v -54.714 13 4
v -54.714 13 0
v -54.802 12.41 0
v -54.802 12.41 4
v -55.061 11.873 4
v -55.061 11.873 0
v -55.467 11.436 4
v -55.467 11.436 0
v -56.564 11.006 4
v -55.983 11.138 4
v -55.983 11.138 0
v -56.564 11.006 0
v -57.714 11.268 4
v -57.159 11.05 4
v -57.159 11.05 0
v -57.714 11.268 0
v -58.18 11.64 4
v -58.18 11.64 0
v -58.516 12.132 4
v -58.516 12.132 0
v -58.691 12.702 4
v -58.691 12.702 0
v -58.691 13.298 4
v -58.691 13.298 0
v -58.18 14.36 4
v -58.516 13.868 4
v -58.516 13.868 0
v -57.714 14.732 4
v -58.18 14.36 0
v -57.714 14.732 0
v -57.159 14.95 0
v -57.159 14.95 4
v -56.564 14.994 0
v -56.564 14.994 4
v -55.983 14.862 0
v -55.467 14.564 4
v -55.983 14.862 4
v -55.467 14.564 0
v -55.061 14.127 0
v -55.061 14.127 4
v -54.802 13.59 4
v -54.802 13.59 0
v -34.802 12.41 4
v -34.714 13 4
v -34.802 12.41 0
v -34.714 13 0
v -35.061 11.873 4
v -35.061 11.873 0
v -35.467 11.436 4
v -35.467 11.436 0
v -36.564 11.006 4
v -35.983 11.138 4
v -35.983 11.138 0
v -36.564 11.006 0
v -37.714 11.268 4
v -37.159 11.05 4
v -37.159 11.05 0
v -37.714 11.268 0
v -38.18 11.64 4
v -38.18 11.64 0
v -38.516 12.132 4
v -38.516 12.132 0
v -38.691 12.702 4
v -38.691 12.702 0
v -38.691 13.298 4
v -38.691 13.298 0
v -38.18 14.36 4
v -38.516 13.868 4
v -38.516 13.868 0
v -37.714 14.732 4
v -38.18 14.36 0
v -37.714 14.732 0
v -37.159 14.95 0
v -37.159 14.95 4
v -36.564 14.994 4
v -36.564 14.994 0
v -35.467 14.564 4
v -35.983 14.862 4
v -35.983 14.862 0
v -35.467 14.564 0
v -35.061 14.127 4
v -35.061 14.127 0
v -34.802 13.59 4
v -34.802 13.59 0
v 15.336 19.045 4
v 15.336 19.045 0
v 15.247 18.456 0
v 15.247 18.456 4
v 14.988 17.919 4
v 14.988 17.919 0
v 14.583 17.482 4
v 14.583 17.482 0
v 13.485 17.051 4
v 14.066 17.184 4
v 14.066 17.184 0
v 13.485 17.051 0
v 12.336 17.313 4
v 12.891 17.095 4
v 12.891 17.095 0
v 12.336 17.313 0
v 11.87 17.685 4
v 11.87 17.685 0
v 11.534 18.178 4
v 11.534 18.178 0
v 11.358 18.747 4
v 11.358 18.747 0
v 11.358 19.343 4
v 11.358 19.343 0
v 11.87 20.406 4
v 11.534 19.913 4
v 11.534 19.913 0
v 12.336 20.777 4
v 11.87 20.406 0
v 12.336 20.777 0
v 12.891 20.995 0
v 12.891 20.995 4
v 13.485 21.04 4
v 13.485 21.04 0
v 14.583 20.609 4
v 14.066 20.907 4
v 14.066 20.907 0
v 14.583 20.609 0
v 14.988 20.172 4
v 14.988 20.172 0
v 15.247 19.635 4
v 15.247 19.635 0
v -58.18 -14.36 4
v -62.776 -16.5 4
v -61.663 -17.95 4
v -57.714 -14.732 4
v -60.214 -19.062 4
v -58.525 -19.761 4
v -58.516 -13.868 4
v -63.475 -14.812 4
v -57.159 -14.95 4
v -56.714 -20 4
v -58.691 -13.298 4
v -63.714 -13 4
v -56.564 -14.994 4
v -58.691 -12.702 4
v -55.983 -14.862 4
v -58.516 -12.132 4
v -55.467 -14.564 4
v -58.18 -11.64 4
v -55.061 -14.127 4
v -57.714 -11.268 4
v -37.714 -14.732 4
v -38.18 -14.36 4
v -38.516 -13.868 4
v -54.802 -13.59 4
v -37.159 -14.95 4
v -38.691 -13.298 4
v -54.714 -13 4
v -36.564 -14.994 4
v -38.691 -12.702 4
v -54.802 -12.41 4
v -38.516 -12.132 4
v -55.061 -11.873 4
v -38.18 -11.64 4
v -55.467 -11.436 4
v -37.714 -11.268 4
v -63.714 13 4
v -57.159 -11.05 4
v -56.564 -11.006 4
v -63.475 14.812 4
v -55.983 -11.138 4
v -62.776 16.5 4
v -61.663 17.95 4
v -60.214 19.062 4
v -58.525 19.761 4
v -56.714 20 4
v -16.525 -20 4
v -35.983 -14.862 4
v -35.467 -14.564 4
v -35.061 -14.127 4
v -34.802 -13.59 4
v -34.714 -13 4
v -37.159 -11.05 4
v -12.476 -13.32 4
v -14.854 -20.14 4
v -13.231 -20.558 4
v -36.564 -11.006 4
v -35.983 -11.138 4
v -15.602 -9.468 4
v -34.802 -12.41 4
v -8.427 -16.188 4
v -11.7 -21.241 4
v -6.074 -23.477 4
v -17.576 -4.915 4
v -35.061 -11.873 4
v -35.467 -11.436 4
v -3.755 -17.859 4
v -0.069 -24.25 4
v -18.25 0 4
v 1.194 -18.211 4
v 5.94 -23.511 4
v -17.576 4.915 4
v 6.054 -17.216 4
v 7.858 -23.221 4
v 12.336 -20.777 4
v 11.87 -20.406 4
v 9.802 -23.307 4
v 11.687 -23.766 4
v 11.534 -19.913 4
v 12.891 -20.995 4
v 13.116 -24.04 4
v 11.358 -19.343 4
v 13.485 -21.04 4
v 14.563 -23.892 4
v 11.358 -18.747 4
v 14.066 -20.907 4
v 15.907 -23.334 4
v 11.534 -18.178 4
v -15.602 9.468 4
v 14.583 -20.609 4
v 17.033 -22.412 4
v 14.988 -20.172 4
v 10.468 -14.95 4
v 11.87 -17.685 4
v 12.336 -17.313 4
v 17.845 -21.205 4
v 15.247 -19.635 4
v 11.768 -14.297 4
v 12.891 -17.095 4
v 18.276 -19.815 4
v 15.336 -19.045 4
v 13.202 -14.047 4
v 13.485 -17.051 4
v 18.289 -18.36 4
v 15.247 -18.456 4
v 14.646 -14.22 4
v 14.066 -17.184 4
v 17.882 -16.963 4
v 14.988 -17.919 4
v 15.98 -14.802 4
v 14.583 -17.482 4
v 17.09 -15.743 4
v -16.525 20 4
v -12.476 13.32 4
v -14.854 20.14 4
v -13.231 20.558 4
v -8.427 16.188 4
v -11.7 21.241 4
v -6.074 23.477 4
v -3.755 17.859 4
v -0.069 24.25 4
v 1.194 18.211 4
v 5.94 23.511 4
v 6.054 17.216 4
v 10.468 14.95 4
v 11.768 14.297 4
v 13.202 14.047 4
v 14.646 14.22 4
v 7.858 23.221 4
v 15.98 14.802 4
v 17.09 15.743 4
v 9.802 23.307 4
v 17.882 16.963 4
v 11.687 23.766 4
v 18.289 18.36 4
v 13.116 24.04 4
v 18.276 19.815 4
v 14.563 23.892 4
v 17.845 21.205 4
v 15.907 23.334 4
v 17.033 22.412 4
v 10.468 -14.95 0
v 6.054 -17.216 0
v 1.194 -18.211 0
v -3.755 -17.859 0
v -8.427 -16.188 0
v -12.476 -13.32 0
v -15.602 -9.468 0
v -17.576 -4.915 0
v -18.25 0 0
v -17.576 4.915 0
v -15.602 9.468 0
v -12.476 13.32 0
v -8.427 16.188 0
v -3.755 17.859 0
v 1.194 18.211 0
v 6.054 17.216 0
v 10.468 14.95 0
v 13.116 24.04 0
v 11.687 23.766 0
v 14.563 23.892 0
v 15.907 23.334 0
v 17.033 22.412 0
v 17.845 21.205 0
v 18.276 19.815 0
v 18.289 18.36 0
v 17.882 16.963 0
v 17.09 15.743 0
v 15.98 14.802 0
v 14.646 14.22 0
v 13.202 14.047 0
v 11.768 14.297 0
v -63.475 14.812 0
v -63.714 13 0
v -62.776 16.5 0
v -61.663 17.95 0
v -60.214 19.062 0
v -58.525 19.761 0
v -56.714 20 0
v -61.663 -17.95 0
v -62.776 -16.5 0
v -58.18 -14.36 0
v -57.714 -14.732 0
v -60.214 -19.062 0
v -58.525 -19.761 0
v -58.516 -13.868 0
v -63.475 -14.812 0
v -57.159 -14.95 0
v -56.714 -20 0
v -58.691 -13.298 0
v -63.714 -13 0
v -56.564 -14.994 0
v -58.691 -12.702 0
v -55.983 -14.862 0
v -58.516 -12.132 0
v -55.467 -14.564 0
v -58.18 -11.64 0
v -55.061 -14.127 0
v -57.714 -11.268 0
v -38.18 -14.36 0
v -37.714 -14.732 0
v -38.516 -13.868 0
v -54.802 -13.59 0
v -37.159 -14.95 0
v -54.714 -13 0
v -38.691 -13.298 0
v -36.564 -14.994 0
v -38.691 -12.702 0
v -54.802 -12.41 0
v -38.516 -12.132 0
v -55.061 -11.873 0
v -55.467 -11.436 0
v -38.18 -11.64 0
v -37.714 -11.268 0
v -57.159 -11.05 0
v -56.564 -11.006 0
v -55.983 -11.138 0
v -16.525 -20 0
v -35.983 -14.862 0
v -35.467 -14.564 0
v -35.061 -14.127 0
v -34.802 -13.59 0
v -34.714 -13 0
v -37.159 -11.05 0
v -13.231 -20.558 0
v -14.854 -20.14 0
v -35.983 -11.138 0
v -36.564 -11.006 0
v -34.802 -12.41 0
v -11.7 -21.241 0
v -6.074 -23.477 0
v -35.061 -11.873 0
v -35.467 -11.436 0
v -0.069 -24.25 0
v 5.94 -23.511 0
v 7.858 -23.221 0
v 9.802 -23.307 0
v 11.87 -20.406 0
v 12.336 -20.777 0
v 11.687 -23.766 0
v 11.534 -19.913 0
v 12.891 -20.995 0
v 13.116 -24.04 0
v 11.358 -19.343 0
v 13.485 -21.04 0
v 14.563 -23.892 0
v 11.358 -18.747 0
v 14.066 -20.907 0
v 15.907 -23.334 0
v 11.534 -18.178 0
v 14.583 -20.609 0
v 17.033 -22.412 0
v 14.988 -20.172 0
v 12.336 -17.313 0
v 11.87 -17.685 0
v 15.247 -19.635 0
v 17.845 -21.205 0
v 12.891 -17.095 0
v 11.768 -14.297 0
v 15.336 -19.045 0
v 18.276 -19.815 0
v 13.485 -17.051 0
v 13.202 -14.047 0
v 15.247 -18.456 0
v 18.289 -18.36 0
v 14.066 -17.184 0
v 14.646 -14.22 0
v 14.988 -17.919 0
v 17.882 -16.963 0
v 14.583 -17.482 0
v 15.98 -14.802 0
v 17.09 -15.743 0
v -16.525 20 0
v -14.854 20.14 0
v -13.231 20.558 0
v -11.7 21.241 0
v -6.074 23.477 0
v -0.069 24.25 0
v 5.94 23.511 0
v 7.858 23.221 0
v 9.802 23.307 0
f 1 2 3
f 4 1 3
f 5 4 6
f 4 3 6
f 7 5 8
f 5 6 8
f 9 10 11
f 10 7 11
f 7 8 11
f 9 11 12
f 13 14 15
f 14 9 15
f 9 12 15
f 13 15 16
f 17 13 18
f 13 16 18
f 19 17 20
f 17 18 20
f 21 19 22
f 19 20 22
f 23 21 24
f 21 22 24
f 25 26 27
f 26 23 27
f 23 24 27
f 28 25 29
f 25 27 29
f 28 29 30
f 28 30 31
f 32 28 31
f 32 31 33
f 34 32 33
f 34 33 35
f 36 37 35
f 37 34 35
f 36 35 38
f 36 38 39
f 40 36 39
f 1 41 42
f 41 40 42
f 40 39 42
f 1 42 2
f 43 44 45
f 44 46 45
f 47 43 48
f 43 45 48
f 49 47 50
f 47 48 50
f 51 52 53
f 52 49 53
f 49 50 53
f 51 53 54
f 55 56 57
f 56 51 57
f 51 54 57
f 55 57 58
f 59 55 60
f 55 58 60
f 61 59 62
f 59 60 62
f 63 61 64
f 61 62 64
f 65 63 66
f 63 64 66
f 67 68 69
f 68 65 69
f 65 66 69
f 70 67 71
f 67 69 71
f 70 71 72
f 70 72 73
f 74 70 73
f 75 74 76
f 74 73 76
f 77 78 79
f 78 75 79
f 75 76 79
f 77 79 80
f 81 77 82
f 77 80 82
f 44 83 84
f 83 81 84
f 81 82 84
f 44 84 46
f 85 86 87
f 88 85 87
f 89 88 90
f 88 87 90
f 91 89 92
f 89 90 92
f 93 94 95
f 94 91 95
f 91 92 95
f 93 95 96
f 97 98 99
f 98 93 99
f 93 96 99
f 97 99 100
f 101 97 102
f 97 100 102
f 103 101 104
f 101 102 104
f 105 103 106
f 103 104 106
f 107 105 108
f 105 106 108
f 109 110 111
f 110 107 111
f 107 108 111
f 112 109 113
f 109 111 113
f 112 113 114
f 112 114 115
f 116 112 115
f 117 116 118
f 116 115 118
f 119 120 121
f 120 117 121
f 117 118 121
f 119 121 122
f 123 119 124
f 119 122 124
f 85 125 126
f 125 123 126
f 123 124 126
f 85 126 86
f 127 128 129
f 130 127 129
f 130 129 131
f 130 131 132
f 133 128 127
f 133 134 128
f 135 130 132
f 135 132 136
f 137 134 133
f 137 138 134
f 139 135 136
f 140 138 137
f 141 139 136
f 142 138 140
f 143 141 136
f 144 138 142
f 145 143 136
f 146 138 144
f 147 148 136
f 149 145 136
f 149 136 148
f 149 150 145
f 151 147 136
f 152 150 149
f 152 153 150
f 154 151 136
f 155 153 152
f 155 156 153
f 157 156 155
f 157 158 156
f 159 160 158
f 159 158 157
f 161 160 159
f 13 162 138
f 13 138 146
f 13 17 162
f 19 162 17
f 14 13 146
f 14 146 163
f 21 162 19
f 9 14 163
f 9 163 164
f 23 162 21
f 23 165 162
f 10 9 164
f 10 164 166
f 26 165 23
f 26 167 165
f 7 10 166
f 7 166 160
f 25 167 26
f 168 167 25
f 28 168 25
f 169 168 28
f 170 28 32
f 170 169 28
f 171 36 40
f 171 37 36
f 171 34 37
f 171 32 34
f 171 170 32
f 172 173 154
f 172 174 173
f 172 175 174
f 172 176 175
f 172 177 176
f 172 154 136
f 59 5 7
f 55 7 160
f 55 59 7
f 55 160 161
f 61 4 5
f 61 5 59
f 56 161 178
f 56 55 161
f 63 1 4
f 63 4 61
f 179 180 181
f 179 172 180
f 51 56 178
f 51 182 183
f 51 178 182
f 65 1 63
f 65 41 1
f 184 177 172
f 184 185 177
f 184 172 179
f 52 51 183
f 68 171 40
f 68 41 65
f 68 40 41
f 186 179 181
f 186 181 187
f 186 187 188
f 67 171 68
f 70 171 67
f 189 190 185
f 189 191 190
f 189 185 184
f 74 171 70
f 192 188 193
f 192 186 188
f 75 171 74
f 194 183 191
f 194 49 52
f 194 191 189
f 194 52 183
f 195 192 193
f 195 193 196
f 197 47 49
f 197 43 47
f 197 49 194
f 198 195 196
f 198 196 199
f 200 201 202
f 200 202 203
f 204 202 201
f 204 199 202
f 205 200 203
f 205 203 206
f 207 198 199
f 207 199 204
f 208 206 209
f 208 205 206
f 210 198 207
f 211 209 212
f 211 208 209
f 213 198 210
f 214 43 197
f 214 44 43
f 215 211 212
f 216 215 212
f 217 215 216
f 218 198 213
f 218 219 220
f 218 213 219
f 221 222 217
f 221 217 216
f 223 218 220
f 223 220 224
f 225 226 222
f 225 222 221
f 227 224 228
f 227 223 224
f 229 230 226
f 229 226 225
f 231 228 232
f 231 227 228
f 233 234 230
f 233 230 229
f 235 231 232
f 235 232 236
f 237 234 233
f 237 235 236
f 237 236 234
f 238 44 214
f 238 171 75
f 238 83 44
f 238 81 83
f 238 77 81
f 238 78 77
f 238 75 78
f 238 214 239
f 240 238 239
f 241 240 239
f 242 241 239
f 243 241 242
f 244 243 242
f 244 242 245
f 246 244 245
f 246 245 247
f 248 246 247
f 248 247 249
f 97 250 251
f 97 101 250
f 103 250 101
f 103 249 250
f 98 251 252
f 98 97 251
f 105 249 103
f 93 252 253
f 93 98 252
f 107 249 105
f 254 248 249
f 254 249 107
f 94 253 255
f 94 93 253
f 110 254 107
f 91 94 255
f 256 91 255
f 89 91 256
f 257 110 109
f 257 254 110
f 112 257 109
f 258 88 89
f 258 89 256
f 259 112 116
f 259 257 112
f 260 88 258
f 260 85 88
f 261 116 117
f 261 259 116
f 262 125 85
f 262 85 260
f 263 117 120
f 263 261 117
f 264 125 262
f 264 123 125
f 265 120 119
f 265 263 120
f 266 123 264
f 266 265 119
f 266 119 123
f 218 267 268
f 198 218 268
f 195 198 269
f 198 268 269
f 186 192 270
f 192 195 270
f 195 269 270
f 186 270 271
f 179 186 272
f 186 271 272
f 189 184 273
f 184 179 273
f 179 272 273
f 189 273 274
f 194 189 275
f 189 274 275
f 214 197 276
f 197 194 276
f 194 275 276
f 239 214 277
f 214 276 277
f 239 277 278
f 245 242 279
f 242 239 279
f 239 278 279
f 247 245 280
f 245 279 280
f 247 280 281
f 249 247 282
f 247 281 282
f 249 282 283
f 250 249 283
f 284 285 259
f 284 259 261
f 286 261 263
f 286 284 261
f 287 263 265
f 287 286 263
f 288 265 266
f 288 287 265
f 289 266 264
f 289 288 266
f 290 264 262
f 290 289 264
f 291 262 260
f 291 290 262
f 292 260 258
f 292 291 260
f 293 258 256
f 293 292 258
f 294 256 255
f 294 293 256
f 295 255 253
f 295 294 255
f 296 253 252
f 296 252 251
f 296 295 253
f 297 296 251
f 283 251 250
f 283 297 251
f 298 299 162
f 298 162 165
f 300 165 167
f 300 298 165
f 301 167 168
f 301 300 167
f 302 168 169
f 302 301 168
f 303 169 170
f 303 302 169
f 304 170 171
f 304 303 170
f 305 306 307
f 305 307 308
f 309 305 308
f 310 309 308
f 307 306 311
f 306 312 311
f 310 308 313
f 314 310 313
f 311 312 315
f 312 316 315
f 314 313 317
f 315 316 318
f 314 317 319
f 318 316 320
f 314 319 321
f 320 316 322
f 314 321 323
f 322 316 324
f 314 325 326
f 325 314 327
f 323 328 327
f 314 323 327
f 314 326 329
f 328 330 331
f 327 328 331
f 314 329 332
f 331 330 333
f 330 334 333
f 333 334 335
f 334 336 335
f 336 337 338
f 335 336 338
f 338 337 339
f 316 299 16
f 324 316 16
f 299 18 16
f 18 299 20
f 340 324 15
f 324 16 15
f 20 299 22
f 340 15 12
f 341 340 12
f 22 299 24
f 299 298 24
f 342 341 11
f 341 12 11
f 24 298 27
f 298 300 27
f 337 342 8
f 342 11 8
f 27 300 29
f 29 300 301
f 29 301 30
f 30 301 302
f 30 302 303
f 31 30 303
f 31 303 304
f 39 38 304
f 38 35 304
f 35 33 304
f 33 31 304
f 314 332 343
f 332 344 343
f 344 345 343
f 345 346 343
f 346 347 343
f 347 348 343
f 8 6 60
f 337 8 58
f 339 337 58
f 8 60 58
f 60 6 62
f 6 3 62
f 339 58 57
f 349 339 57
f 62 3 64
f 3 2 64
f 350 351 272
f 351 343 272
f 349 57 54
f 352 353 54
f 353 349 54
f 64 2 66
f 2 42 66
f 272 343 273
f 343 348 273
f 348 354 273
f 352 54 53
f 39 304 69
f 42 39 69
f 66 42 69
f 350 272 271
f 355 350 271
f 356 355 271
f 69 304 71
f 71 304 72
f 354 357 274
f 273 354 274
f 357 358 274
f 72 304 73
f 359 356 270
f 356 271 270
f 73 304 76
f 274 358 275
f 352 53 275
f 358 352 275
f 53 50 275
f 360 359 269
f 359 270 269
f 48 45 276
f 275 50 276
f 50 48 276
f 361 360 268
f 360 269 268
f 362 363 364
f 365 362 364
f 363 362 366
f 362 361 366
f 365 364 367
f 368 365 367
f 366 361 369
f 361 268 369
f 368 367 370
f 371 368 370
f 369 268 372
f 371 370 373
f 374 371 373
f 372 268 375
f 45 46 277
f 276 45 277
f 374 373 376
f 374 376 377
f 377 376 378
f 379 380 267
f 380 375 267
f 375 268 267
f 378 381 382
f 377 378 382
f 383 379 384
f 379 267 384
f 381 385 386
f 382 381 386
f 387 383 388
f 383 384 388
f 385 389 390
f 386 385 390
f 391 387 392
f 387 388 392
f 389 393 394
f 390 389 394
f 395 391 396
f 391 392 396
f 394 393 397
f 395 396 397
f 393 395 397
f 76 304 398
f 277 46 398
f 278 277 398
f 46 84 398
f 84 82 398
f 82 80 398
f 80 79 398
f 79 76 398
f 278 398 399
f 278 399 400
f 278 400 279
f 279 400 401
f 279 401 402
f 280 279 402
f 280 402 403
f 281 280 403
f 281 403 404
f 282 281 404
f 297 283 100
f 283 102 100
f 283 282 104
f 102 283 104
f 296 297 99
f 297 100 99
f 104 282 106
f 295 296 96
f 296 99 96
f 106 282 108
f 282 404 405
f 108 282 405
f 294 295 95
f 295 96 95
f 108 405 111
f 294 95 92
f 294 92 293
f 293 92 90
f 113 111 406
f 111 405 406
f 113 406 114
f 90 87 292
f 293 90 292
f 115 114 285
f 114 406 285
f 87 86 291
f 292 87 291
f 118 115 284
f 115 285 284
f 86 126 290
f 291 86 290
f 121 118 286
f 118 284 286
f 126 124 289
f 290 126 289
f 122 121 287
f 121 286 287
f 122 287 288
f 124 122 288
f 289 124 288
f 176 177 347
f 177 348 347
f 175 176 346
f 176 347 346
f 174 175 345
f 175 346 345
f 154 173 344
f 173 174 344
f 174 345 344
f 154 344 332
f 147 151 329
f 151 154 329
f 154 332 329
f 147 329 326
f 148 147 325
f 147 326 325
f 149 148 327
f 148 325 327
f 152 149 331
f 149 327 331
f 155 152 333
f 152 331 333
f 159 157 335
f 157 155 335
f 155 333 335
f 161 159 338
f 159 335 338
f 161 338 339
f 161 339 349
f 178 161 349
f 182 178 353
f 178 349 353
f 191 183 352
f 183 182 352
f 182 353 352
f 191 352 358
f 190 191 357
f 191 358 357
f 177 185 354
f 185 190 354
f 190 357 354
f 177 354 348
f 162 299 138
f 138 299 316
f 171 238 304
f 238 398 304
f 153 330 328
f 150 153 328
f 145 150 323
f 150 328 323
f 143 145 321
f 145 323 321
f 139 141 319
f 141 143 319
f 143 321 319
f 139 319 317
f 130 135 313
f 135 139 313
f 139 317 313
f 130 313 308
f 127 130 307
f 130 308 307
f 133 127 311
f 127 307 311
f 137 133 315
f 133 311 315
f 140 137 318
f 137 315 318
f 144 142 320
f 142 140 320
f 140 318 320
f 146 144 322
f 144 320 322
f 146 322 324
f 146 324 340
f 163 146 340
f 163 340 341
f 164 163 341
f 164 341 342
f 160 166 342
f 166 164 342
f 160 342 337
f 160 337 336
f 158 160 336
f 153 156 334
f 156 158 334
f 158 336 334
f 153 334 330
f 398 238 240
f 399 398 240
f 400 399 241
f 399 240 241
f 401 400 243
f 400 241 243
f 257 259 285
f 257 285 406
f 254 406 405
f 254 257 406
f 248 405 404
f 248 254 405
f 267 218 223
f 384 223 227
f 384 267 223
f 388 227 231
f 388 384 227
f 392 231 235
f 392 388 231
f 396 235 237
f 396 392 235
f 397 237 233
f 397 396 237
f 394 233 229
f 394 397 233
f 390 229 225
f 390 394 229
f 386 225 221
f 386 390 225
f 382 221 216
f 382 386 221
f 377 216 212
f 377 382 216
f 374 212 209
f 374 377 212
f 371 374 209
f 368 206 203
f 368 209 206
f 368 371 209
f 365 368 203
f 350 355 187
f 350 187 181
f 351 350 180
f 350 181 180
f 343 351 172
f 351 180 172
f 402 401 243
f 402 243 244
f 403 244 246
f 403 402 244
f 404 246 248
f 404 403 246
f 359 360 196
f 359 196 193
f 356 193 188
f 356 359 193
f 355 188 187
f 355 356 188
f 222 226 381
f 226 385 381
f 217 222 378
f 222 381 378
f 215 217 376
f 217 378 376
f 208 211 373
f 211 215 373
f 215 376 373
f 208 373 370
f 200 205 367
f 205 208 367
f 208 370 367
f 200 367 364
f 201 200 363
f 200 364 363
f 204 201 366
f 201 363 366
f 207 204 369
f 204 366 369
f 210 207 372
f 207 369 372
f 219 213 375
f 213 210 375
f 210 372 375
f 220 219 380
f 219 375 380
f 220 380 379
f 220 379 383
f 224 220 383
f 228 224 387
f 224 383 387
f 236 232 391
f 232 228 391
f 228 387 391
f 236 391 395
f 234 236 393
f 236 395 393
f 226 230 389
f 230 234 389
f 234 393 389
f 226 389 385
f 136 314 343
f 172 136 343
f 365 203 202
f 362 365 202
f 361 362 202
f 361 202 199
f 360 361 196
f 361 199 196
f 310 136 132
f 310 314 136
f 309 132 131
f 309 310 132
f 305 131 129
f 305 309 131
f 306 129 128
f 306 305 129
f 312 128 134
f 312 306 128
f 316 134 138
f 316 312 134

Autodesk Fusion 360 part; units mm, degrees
sketch "Sketch1" plane through (0, 0, 0) normal (0, 0, 1) x (1, 0, 0)
  circle A0 centre (13.3357, 19.0453) radius 5
  circle A1 centre (13.3357, -19.0453) radius 5
  line L0 (0, 0) -> (80.5902, 0) construction
  line L1 (0, 0) -> (13.3357, 19.0453) construction
  arc A2 (10.4678, 14.9495) -> (10.4678, -14.9495) centre (0, 0) ccw
  arc A3 (9.5367, 22.2961) -> (9.5367, -22.2961) centre (0, 0) ccw
  line L2 (-13.7136, 20) -> (-56.7136, 20)
  line L3 (-56.7136, -20) -> (-13.7136, -20)
  line L4 (0, 0) -> (-230.6085, 0) construction
  circle A4 centre (13.3357, 19.0453) radius 2
  circle A5 centre (13.3357, -19.0453) radius 2
  line L5 (-63.7136, 13) -> (-63.7136, -13)
  arc A6 (-56.7136, 20) -> (-63.7136, 13) centre (-56.7136, 13) ccw
  arc A7 (-63.7136, -13) -> (-56.7136, -20) centre (-56.7136, -13) ccw
  circle A8 centre (-56.7136, 13) radius 2
  circle A9 centre (-56.7136, -13) radius 2
  circle A10 centre (-36.7136, 13) radius 2
  circle A11 centre (-36.7136, -13) radius 2
  point P0 (-63.7136, 20)
  point P1 (-63.7136, -20)
  dimension "d1" = 36.5
  dimension "d2" = 6
  dimension "d3" = 55
  dimension "d4" = 10
  dimension "d5" = 40
  dimension "d23" = 4
  dimension "d25" = 50
  dimension "d26" = 7
  dimension "d27" = 4
  dimension "d30" = 20
extrude "Extrude1" add sketch "Sketch1" along normal blind 4
fillet "Fillet1" radius 10 4 edges at (9.5367, 22.2961, 2) (-13.7136, 20, 2) (9.5367, -22.2961, 2) (-13.7136, -20, 2)
